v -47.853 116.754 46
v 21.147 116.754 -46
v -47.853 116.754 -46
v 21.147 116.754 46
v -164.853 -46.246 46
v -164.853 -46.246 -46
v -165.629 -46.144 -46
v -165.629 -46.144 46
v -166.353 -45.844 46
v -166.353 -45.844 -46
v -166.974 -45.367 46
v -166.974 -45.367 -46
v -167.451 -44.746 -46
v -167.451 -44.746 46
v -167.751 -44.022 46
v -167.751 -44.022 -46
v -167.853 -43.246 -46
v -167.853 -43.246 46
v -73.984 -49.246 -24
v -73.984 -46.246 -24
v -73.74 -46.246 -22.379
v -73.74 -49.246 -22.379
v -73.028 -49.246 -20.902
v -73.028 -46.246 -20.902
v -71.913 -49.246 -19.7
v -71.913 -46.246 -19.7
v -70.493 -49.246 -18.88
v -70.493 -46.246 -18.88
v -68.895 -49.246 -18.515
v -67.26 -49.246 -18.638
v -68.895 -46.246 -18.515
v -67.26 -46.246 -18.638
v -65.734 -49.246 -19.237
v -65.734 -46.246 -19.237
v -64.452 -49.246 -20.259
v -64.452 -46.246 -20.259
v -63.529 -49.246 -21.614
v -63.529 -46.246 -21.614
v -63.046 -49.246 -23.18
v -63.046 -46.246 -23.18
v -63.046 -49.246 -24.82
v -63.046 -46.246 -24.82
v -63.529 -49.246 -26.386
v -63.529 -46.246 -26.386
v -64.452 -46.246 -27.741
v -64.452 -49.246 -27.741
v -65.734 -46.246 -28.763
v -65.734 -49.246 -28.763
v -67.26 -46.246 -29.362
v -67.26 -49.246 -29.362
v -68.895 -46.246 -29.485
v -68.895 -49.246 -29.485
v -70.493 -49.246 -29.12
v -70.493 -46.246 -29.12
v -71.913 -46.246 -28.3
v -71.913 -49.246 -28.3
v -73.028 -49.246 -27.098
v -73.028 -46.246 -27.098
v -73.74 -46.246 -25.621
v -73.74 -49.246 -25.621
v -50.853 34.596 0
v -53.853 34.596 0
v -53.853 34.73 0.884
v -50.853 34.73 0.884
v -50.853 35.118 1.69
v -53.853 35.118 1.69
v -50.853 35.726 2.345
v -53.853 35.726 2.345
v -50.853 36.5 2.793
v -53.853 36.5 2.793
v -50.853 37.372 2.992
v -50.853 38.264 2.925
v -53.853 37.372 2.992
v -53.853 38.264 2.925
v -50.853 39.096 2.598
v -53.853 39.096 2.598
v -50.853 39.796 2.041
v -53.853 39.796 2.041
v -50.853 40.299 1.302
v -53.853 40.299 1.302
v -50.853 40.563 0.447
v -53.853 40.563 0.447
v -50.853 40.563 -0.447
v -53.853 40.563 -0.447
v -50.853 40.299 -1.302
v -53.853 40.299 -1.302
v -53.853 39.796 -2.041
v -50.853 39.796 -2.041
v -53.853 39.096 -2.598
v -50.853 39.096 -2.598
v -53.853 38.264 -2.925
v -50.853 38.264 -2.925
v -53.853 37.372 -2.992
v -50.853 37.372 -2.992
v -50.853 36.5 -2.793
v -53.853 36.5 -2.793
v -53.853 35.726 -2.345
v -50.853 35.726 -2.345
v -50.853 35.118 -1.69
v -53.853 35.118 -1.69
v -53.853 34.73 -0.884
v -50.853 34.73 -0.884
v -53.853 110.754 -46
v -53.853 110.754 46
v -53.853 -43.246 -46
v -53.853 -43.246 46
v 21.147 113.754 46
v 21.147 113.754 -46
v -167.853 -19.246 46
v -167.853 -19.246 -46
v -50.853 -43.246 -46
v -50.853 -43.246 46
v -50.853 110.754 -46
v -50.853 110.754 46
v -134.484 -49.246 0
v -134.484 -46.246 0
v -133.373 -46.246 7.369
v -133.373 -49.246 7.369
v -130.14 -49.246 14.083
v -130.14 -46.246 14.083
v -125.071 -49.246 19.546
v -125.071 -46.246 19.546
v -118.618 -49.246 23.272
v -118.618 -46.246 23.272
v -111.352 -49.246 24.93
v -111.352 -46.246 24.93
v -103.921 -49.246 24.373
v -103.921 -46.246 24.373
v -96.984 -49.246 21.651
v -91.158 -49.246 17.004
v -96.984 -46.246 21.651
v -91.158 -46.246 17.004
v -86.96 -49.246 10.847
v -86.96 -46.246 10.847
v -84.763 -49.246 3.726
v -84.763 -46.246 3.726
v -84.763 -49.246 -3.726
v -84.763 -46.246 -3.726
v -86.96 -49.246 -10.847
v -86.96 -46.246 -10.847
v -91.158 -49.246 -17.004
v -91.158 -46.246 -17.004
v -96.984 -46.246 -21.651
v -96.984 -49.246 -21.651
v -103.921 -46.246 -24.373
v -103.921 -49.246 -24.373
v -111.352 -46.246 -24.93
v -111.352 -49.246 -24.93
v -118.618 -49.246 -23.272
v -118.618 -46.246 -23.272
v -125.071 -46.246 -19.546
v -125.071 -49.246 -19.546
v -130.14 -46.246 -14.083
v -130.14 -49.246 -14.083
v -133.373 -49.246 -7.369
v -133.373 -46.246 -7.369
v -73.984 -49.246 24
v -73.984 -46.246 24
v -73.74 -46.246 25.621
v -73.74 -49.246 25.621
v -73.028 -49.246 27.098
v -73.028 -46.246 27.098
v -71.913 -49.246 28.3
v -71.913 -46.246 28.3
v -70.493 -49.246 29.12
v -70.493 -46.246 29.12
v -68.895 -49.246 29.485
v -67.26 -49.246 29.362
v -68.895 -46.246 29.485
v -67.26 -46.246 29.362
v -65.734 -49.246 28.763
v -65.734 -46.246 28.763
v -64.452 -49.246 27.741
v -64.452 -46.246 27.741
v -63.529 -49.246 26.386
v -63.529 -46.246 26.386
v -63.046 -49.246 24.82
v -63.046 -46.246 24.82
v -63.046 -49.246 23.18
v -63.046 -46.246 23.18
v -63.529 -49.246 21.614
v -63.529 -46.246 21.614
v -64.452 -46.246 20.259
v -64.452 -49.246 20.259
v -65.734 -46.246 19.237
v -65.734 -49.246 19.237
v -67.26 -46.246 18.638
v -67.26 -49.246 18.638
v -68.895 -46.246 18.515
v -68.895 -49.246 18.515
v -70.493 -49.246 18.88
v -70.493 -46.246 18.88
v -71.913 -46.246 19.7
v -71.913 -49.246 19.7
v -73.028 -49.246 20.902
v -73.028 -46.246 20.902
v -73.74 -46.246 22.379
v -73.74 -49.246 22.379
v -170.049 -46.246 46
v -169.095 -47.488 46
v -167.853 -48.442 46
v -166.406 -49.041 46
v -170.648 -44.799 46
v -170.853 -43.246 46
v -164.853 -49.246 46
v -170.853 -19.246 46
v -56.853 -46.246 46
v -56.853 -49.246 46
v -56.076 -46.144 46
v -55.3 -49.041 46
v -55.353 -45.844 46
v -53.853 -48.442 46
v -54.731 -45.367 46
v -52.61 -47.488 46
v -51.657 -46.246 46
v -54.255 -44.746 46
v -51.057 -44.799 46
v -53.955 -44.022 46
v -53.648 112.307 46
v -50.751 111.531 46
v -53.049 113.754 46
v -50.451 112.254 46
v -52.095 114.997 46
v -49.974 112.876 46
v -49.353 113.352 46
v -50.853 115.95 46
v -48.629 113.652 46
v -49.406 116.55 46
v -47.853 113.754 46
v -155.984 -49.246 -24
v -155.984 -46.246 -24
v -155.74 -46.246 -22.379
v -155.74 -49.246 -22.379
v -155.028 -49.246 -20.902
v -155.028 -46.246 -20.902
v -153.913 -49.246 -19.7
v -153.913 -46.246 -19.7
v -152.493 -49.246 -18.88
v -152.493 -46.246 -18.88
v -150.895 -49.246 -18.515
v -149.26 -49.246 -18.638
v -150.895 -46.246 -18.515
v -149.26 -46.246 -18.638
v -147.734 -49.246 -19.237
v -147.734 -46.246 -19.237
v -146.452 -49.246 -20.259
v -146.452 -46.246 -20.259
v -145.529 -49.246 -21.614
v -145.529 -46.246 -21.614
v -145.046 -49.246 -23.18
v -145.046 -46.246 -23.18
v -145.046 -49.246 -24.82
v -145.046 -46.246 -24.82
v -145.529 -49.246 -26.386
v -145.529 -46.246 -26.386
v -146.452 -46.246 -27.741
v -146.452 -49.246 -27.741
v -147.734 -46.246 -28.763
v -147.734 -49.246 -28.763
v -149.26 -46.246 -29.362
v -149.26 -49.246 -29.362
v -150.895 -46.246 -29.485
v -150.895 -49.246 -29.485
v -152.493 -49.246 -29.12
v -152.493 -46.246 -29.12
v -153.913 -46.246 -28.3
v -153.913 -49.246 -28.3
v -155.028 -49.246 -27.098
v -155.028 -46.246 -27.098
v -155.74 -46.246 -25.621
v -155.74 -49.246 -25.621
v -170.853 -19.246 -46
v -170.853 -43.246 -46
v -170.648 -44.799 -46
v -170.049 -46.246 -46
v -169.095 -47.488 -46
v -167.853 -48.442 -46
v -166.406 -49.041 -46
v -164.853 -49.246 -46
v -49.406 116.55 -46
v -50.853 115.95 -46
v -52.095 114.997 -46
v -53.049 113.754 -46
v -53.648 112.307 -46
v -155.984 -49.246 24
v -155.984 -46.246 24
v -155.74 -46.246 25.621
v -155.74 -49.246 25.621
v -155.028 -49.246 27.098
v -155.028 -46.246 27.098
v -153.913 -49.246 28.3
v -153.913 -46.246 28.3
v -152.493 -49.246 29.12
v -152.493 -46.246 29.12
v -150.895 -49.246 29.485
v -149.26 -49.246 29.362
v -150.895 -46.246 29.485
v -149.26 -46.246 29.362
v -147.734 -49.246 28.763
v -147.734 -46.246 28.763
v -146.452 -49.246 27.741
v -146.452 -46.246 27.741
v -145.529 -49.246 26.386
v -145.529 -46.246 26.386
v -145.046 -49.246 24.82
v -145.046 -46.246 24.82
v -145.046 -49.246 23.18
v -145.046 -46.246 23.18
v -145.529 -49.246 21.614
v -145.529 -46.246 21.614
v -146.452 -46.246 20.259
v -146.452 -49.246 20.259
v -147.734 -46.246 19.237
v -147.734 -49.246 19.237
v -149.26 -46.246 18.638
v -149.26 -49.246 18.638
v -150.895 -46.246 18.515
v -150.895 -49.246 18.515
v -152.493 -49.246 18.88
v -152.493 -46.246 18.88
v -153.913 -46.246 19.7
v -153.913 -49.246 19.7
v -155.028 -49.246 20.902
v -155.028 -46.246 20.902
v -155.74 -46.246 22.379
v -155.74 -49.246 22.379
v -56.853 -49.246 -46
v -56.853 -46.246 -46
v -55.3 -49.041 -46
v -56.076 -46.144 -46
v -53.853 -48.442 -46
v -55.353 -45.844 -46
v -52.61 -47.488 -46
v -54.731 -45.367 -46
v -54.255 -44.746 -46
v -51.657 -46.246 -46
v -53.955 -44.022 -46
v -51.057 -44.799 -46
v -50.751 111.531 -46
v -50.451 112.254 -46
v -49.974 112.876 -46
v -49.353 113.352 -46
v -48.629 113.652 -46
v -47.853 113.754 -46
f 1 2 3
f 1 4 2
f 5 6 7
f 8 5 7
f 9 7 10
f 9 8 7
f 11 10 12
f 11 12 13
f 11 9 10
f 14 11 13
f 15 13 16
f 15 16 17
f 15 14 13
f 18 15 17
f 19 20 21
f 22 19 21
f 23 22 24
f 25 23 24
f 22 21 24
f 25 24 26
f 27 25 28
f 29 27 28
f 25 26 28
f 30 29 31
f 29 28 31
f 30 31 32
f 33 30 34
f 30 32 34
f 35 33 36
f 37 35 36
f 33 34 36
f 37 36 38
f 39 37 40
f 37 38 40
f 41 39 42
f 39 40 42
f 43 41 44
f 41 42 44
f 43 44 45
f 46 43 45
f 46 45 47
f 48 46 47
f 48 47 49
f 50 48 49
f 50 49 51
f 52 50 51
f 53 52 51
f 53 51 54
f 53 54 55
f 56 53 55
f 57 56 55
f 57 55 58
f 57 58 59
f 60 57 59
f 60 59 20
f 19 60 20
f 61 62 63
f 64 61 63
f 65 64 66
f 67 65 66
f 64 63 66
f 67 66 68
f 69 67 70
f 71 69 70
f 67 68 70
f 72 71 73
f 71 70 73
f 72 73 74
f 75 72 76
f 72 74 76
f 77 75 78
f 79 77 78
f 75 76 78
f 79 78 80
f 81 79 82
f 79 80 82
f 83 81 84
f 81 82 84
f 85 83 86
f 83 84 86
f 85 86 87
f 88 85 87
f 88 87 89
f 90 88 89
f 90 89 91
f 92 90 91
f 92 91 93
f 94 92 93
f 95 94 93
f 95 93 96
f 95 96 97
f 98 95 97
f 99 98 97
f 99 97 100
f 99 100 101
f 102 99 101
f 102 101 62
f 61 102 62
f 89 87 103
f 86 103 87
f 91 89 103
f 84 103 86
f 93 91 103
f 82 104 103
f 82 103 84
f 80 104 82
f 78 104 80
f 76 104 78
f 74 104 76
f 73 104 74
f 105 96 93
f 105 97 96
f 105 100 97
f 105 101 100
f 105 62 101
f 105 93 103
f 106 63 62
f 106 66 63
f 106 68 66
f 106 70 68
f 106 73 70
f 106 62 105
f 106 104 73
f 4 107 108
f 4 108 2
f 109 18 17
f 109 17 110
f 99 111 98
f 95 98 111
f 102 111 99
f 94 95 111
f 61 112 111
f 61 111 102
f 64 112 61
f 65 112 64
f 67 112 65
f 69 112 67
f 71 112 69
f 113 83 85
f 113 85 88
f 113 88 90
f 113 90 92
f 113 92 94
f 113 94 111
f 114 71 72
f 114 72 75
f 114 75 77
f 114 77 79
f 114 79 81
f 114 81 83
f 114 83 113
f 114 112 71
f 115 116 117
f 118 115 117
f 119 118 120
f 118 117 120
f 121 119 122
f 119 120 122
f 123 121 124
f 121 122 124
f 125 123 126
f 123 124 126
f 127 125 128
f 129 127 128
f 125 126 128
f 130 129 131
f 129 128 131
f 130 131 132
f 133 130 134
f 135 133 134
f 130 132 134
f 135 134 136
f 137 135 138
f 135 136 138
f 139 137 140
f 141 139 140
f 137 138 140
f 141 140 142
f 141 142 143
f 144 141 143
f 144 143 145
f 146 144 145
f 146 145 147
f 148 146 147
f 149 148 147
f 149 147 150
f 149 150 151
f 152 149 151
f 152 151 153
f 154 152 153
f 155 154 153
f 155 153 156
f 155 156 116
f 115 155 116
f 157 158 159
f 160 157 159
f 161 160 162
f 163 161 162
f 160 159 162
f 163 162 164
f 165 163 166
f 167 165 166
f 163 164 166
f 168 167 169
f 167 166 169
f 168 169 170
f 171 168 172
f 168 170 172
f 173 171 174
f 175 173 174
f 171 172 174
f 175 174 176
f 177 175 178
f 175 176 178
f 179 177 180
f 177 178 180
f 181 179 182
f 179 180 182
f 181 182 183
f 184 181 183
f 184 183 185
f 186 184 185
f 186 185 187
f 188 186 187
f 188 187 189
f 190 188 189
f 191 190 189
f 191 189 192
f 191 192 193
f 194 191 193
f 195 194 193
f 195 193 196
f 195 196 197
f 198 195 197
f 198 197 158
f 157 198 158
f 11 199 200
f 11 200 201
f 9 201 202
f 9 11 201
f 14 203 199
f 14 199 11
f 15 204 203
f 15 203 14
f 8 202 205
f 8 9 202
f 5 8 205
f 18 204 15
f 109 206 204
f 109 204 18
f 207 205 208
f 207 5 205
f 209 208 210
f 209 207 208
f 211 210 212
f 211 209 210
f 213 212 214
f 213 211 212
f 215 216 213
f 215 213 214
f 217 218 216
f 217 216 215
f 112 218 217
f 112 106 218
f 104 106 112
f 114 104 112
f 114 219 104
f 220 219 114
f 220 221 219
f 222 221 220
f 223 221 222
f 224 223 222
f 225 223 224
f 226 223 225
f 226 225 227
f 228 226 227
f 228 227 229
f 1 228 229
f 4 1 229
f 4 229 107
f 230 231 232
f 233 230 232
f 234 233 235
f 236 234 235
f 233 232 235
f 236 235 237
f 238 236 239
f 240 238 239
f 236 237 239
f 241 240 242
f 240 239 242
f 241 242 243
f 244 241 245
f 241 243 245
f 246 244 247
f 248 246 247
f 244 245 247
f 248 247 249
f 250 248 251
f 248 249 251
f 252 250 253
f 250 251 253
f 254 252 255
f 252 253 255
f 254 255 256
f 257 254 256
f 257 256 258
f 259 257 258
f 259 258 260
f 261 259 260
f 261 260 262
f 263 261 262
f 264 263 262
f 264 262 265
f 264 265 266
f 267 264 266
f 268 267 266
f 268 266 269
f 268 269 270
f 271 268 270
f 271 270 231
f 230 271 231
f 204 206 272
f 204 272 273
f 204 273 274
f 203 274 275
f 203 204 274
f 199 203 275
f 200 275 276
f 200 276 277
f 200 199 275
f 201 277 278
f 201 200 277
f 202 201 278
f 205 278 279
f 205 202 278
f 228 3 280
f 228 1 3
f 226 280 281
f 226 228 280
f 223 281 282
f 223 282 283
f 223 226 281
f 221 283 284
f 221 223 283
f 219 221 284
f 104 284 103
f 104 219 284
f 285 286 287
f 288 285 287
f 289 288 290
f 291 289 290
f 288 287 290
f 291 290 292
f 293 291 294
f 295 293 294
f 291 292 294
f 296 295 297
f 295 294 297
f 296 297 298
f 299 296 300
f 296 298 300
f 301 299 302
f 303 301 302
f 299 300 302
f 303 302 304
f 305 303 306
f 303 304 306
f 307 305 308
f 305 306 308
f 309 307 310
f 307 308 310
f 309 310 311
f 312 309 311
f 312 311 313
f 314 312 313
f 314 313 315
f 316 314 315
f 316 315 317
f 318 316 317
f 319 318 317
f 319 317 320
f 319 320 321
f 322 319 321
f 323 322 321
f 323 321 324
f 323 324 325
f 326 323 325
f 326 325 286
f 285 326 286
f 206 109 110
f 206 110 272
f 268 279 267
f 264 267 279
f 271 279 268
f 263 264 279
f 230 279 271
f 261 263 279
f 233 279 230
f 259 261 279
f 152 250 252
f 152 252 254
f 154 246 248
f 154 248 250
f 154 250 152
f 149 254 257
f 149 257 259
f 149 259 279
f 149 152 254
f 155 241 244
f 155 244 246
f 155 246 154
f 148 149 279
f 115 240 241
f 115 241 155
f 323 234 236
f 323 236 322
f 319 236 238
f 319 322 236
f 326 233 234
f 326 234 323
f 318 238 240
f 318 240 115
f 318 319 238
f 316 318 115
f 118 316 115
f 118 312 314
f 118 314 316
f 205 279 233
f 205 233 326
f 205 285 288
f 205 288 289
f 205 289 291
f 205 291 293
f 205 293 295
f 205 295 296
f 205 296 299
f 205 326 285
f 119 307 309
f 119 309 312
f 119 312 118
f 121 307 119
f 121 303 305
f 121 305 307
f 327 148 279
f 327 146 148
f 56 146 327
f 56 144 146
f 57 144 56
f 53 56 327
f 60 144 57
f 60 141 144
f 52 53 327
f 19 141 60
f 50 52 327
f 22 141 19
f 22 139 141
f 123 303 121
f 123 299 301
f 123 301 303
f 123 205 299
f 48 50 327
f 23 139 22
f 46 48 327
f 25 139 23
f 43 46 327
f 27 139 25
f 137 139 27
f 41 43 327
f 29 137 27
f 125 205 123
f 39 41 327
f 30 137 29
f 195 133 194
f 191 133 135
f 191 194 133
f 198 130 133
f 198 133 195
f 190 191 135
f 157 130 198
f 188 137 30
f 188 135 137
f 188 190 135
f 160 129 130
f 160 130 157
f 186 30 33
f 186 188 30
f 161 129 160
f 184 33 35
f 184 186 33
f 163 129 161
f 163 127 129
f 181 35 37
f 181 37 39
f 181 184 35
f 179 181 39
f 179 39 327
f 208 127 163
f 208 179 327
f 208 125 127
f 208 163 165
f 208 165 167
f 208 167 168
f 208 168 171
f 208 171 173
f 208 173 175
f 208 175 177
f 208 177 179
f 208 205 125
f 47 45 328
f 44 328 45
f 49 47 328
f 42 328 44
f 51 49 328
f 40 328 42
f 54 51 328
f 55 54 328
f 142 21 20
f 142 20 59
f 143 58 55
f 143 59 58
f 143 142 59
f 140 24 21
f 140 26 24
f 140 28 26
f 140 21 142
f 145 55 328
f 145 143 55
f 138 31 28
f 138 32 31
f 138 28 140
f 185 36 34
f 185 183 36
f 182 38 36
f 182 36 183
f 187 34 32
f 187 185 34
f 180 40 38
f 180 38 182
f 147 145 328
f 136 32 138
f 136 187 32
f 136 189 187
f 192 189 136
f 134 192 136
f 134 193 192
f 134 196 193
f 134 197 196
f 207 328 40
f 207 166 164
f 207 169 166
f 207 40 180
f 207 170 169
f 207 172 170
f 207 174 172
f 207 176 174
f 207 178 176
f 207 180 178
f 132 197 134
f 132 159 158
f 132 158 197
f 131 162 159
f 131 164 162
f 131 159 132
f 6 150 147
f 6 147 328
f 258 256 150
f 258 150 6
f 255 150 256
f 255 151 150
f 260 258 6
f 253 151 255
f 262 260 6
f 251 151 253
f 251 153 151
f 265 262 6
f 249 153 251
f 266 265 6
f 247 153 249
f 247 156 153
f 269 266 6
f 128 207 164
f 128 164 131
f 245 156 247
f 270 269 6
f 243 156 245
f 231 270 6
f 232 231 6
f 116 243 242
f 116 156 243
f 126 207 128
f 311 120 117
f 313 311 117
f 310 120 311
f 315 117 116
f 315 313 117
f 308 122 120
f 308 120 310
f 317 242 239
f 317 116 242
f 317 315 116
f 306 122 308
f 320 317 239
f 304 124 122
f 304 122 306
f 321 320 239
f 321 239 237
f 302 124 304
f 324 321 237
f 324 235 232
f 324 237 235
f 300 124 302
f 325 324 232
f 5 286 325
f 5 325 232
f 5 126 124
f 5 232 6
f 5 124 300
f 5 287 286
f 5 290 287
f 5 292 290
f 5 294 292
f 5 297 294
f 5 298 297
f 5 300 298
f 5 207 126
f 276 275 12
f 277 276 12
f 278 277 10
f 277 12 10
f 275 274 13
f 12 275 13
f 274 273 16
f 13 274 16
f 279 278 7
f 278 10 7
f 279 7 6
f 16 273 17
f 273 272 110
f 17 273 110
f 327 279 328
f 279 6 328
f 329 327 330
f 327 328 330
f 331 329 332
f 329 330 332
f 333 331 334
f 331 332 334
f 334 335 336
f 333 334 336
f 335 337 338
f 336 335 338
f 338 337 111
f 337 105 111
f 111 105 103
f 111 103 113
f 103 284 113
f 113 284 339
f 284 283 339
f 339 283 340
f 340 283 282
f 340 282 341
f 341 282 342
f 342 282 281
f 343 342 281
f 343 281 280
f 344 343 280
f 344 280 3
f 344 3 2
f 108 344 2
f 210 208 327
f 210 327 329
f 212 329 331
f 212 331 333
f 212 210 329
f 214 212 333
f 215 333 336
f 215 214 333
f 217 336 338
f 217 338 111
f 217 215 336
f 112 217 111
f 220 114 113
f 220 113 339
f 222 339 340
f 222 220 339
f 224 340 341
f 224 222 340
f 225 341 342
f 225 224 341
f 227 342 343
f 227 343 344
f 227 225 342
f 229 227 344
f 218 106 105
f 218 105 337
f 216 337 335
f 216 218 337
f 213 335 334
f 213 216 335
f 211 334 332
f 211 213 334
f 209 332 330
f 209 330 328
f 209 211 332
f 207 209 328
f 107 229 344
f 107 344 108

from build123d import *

# Parameters (mm, degrees)
F1_DEPTH = 46
F3_D     = 11
F4_D     = 50
F7_D     = 6


# Not quite as in the source:
# - the program builds the solid bodies; features that only make, move or delete a surface that nothing else refers to are left out


with BuildPart() as f1:
    # F0 (on Top) → F1 (new body, symmetric)
    with BuildSketch(Plane.XY):
        with BuildLine():
            Line((-53.8527505398, 110.754218787), (-53.8527505398, -43.245781213))
            ThreePointArc((-53.8527505398, -43.245781213), (-54.7314301962, -45.3671015566), (-56.8527505398, -46.245781213))
            Line((-56.8527505398, -46.245781213), (-164.8527505398, -46.245781213))
            ThreePointArc((-164.8527505398, -46.245781213), (-166.9740708833, -45.3671015566), (-167.8527505398, -43.245781213))
            Line((-167.8527505398, -43.245781213), (-167.8527505398, -19.245781213))
            Line((-167.8527505398, -19.245781213), (-170.8527505398, -19.245781213))
            Line((-170.8527505398, -19.245781213), (-170.8527505398, -43.245781213))
            ThreePointArc((-170.8527505398, -43.245781213), (-169.0953912269, -47.4884219002), (-164.8527505398, -49.245781213))
            Line((-164.8527505398, -49.245781213), (-56.8527505398, -49.245781213))
            ThreePointArc((-56.8527505398, -49.245781213), (-52.6101098527, -47.4884219002), (-50.8527505398, -43.245781213))
            Line((-50.8527505398, -43.245781213), (-50.8527505398, 110.754218787))
            ThreePointArc((-50.8527505398, 110.754218787), (-49.9740708833, 112.8755391305), (-47.8527505398, 113.754218787))
            Line((-47.8527505398, 113.754218787), (21.1472494602, 113.754218787))
            Line((21.1472494602, 113.754218787), (21.1472494602, 116.754218787))
            Line((21.1472494602, 116.754218787), (-47.8527505398, 116.754218787))
            ThreePointArc((-47.8527505398, 116.754218787), (-52.0953912269, 114.9968594741), (-53.8527505398, 110.754218787))
        make_face()
    extrude(amount=F1_DEPTH, both=True)

    # F3 (through all)
    with Locations(Plane.XZ.offset(49.245781213)):
        with Locations((-150.4841212034, 24), (-68.4841212034, 24), (-68.4841212034, -24), (-150.4841212034, -24)):
            Hole(F3_D / 2)

    # F4 (through all)
    with Locations(Plane.XZ.offset(49.245781213)):
        with Locations((-109.4841212034, 0)):
            Hole(F4_D / 2)

    # F7 (through all)
    with Locations(Plane.YZ.offset(-50.8527505398)):
        with Locations((37.5964443088, 0)):
            Hole(F7_D / 2)


solid = f1.part
